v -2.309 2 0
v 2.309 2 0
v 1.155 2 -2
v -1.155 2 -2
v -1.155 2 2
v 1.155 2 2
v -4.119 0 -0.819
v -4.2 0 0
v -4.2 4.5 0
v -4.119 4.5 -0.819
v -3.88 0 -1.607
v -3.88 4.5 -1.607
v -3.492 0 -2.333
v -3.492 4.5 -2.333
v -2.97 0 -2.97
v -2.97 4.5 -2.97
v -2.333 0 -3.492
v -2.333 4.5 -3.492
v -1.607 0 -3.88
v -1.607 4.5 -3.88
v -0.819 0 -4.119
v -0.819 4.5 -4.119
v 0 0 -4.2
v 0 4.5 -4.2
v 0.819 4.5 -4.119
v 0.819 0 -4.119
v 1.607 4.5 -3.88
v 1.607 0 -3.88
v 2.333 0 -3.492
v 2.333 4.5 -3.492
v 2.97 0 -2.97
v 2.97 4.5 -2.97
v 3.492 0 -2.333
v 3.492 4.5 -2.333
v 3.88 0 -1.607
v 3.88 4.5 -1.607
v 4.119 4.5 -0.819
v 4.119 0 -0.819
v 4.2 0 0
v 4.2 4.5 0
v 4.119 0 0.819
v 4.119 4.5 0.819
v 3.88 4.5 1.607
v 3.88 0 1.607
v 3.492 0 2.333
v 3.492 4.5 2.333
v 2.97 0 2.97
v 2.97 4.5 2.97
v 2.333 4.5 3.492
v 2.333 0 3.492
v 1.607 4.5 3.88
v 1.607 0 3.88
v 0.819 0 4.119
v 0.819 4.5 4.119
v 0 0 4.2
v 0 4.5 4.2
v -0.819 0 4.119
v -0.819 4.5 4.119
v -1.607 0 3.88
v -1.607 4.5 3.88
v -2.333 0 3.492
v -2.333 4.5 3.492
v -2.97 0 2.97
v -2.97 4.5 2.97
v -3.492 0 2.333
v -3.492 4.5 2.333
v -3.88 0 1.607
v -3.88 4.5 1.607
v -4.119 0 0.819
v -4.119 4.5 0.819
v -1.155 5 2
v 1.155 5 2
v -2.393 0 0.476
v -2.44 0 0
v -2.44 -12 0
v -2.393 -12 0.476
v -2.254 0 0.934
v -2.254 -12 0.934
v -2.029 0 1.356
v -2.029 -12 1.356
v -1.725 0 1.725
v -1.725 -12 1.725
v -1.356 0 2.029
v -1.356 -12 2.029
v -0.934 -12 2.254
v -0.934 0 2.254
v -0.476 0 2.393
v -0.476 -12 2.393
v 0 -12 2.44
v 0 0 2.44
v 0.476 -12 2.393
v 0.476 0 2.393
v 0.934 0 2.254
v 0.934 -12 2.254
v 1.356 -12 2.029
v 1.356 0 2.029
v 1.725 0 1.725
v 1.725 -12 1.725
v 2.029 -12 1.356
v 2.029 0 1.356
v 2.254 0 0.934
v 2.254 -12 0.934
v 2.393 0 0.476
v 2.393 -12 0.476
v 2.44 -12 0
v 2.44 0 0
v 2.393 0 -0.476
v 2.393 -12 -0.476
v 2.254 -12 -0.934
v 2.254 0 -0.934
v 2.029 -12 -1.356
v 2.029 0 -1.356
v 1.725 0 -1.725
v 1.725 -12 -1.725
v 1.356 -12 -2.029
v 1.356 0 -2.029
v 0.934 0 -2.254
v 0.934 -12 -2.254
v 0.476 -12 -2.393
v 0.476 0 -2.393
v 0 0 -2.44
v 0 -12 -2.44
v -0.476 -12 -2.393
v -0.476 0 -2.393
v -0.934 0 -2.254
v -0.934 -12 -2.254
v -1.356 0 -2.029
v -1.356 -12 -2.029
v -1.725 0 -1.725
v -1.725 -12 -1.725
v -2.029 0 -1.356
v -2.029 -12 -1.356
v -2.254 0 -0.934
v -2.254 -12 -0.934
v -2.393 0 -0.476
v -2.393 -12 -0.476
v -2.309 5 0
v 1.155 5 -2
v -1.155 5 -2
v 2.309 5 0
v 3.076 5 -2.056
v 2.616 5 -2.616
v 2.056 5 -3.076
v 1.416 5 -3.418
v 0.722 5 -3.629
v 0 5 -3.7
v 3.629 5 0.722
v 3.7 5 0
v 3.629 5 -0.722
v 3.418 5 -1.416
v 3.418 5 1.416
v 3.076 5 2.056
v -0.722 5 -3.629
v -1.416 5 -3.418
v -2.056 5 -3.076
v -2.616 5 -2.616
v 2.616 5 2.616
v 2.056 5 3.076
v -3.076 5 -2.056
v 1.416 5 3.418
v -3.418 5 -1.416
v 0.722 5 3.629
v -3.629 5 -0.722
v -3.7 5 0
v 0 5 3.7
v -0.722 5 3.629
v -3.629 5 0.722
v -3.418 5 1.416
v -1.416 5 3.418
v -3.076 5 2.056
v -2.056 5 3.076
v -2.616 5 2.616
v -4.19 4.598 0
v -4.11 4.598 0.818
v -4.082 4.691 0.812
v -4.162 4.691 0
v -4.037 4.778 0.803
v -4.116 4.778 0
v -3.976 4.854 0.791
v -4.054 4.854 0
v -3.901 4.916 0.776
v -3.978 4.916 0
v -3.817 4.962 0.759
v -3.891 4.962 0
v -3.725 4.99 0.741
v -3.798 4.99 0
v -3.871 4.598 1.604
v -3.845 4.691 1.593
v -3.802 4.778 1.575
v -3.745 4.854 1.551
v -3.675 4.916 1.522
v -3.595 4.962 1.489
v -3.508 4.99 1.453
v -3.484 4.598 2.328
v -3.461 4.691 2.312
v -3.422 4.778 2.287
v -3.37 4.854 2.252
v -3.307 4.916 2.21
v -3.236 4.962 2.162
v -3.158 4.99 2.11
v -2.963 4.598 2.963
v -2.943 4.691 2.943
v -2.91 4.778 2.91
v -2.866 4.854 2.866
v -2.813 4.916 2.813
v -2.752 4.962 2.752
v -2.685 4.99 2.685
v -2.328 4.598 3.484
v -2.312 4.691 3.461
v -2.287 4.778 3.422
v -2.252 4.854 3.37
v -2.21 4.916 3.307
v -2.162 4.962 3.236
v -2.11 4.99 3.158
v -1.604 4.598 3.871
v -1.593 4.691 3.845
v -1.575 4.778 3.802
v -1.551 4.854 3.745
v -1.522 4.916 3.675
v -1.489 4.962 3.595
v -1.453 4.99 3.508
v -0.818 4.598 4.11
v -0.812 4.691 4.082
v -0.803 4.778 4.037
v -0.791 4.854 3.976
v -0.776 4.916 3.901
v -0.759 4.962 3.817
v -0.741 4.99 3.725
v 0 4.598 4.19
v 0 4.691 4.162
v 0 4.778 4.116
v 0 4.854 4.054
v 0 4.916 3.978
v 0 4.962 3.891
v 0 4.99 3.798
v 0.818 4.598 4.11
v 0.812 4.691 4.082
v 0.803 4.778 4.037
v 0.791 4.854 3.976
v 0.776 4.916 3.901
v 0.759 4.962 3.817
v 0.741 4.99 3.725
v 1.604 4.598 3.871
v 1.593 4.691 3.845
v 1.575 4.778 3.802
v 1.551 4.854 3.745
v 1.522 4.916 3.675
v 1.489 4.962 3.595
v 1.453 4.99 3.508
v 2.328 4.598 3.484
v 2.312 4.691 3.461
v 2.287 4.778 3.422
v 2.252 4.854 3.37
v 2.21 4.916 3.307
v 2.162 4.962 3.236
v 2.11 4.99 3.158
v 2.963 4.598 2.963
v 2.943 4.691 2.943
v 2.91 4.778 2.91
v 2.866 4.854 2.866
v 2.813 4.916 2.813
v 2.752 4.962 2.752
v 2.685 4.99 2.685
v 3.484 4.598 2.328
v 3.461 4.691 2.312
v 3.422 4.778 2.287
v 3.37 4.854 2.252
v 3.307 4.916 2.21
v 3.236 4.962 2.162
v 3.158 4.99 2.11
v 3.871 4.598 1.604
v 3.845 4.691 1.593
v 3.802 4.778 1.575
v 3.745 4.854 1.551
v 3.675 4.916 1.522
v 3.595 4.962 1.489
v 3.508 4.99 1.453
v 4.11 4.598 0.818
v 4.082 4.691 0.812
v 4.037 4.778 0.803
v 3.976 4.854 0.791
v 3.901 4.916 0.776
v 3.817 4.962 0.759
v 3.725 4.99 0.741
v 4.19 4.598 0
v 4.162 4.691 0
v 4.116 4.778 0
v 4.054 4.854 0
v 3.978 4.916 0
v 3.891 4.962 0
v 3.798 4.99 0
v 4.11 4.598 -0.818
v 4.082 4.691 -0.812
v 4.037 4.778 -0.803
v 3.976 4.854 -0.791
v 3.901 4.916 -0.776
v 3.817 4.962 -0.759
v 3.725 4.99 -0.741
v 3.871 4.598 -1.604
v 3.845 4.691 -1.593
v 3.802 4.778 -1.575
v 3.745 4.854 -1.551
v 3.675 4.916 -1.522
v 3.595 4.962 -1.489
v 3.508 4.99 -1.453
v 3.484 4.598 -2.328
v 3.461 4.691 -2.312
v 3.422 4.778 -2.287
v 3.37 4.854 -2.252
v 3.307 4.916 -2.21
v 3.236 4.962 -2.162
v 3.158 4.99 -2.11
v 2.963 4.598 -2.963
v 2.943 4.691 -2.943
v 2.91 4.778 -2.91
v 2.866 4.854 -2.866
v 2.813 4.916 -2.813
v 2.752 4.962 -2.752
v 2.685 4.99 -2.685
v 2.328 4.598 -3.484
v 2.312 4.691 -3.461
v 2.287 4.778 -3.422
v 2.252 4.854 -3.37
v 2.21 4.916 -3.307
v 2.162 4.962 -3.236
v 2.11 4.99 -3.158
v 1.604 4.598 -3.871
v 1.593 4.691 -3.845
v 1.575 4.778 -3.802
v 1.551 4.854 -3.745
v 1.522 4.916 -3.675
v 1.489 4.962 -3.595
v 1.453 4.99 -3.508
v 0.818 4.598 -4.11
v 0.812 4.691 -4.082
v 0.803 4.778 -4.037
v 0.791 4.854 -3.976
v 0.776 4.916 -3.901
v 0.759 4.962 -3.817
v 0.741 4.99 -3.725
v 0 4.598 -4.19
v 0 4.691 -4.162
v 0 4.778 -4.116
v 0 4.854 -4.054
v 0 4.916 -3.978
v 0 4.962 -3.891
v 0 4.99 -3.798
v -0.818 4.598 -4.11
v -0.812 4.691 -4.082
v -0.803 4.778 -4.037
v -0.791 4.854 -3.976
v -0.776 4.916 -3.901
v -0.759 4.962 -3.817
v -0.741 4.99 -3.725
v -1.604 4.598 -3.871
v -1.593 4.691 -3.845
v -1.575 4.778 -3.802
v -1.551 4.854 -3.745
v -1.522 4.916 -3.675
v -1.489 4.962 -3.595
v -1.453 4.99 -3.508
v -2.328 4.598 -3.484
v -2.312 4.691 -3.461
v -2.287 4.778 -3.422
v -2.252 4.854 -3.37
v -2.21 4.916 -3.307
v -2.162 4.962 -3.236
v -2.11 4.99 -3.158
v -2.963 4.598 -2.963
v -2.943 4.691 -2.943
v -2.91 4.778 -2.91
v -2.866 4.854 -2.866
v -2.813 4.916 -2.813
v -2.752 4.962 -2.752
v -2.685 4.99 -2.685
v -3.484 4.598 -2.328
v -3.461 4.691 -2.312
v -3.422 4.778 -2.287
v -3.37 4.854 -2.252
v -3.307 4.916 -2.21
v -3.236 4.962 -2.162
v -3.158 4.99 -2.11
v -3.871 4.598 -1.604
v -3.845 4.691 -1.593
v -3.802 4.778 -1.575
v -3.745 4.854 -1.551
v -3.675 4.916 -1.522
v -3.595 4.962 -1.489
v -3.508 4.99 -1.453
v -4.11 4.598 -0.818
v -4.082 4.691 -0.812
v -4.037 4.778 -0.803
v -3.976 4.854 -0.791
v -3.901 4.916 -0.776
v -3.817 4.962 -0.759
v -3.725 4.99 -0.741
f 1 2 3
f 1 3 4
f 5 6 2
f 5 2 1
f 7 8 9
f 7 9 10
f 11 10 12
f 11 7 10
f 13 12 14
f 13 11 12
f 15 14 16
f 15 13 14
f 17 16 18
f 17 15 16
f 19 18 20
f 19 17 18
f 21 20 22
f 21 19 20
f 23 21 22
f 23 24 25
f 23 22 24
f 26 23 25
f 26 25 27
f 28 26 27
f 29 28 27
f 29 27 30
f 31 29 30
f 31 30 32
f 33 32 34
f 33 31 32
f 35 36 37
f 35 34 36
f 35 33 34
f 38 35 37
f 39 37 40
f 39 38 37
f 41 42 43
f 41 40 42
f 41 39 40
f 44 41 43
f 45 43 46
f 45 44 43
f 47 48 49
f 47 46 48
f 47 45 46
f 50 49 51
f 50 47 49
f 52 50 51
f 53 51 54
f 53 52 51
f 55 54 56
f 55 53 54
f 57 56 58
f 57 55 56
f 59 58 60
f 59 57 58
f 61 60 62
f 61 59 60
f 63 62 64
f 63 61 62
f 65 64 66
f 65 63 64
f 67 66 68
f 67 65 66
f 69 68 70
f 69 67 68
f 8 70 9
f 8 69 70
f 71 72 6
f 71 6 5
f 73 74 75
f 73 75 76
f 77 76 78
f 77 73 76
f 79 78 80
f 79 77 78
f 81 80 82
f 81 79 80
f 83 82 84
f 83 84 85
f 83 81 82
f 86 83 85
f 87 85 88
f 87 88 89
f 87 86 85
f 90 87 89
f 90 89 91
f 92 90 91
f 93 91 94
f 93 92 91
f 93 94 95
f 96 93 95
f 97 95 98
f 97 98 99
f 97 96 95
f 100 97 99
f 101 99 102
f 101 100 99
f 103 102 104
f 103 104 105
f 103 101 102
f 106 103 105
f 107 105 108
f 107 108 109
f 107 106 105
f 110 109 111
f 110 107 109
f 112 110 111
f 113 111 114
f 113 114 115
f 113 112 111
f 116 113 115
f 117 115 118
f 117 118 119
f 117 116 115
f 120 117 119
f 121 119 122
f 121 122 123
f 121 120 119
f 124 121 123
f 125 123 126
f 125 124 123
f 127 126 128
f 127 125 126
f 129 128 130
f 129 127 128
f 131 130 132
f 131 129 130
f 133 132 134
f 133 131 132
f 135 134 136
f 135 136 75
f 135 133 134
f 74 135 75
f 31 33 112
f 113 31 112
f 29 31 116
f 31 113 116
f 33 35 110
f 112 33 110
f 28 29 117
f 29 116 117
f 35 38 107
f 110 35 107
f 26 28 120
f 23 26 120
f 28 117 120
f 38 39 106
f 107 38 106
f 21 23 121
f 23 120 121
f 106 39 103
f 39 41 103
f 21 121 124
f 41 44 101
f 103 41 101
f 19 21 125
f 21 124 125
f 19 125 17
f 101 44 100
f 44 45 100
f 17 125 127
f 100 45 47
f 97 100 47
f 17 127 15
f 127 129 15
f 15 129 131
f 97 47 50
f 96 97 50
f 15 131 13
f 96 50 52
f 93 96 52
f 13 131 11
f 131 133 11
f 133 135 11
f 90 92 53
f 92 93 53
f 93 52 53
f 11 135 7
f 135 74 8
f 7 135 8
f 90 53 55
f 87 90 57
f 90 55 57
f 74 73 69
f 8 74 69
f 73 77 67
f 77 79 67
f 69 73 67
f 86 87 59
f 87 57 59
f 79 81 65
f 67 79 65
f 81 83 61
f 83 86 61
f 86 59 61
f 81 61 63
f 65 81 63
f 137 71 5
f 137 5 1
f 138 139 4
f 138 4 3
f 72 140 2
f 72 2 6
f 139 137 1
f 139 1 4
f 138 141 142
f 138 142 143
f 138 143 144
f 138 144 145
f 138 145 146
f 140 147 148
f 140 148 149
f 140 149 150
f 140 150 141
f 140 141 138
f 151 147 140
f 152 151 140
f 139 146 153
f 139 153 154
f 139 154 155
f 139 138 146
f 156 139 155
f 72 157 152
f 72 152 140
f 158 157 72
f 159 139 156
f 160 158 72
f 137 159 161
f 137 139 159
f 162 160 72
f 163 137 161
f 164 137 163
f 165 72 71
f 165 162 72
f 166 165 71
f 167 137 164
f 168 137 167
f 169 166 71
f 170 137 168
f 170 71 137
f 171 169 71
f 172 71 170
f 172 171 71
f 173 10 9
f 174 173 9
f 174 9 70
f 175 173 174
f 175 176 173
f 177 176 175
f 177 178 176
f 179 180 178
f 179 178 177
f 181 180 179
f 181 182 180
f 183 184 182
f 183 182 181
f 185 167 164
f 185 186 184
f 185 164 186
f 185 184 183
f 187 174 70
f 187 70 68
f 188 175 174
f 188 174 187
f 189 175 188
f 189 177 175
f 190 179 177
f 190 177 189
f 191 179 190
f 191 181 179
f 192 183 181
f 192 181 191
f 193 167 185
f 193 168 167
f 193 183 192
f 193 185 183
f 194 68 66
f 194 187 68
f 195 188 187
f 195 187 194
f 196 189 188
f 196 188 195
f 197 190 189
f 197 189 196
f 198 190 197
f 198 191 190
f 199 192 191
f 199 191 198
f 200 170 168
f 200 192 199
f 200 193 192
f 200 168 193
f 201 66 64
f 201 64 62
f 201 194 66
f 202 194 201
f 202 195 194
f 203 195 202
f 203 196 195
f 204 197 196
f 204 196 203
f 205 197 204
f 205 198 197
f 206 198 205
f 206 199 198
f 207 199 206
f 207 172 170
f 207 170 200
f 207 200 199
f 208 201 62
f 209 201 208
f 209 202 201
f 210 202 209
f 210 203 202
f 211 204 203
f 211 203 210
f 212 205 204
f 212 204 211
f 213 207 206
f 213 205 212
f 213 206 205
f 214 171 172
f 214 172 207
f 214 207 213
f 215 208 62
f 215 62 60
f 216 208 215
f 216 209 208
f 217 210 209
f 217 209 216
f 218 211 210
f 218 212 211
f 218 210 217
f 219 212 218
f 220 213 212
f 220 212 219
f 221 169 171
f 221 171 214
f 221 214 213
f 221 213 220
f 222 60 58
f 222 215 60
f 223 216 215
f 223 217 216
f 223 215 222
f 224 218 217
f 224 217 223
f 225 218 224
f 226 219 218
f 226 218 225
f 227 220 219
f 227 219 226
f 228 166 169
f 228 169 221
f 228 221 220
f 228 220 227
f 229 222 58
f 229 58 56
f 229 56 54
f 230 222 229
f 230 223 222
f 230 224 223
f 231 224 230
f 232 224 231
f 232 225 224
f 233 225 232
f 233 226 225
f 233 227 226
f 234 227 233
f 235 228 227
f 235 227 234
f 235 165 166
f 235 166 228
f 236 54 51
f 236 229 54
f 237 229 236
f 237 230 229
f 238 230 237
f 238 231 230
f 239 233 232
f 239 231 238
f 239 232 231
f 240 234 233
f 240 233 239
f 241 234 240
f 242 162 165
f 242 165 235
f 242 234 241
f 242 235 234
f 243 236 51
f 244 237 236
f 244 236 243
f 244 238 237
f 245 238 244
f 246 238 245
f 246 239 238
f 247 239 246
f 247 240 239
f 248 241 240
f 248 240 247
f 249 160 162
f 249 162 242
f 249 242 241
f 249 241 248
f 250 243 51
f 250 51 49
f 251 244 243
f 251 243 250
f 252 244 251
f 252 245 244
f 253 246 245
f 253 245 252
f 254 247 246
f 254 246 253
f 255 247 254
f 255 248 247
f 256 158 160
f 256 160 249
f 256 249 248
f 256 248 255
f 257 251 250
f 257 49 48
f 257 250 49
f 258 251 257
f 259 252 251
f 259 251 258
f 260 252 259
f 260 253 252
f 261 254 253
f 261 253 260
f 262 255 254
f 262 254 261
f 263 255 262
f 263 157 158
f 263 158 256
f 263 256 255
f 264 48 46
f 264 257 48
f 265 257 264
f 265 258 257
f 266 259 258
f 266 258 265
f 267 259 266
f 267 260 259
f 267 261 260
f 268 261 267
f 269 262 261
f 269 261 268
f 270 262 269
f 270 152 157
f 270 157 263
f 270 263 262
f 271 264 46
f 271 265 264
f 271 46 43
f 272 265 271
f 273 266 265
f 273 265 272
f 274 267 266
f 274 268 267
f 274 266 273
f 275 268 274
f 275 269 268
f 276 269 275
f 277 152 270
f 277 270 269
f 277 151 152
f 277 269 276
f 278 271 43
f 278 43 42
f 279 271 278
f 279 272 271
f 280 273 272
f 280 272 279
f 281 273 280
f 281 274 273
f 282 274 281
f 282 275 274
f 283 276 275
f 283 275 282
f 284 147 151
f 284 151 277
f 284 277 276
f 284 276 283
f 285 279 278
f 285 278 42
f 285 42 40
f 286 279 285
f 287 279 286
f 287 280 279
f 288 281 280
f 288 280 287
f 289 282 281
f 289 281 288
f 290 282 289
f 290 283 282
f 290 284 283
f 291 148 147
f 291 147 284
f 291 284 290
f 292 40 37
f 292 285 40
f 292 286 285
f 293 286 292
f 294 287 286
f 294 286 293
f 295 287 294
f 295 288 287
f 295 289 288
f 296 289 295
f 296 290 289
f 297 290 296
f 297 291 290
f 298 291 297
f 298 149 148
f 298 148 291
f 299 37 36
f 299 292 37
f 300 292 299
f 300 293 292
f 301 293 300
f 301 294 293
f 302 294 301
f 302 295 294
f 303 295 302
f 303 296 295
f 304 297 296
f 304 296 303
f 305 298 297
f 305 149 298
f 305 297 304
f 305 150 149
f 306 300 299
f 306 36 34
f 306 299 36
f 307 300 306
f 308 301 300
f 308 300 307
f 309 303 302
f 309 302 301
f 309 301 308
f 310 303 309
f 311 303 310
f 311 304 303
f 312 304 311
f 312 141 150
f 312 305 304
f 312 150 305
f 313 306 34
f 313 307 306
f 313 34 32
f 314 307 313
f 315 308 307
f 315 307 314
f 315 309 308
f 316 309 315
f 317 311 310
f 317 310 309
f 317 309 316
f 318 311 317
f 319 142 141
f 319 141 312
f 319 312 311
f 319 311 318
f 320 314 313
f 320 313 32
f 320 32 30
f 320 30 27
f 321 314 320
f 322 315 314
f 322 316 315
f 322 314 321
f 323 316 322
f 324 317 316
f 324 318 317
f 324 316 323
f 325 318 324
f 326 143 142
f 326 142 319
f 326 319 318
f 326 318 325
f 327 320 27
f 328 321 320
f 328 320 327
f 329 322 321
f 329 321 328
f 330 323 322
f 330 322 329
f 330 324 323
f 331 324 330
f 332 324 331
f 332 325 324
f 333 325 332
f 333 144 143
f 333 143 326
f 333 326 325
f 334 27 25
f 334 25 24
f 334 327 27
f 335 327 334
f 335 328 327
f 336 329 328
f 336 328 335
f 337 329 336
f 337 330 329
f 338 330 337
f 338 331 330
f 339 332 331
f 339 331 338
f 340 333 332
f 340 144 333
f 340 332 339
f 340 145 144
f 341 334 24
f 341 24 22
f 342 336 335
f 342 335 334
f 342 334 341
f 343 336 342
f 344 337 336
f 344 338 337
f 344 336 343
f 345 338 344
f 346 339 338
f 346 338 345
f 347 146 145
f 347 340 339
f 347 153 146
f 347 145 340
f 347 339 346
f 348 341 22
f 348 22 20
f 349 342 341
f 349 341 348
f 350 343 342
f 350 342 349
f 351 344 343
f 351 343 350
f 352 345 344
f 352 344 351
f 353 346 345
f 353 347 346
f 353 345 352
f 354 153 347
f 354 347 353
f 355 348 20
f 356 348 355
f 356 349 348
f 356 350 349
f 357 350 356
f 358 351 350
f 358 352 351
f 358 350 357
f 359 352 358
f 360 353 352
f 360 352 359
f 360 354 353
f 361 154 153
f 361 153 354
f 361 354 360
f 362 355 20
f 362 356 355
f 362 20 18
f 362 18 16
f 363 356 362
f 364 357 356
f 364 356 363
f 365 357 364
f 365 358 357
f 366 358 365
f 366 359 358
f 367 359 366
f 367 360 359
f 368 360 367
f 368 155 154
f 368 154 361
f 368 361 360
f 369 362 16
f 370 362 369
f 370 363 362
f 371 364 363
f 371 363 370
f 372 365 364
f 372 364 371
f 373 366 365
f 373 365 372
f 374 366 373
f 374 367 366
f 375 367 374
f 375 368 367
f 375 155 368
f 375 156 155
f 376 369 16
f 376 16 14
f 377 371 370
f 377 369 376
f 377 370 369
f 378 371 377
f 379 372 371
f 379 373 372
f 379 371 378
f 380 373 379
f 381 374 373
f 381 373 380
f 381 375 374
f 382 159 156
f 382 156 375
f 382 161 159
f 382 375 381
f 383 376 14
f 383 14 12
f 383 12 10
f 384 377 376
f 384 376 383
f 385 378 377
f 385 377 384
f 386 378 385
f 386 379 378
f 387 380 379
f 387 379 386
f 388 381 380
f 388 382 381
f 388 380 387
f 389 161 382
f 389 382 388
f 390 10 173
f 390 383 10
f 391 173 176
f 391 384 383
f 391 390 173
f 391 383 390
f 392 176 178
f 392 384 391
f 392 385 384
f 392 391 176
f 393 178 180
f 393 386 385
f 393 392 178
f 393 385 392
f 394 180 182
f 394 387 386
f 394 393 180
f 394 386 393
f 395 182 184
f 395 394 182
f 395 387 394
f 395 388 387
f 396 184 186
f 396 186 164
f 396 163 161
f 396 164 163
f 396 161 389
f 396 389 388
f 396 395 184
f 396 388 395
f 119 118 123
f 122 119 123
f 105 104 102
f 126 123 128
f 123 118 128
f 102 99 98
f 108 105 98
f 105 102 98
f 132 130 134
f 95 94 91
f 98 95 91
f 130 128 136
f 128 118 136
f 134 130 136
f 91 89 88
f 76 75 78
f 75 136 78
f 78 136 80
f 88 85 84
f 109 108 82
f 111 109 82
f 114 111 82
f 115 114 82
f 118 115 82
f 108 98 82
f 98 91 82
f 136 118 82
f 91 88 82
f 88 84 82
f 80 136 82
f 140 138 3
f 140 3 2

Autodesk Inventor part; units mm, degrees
ref_plane "YZ Plane" through (0, 0, 0) normal (1, 0, 0) x (0, 1, 0)
ref_plane "XZ Plane" through (0, 0, 0) normal (0, 1, 0) x (-1, 0, 0)
ref_plane "XY Plane" through (0, 0, 0) normal (0, 0, 1) x (1, 0, 0)
sketch "Sketch1" plane through (0, 0, 0) normal (0, 1, 0) x (-1, 0, 0)
  circle A0 centre (0, 0) radius 2.44
  circle A1 centre (0, 0) radius 4.2
  line L0 (1.1547, -2) -> (-1.1547, -2)
  line L1 (-1.1547, -2) -> (-2.3094, 0)
  line L2 (-2.3094, 0) -> (-1.1547, 2)
  line L3 (-1.1547, 2) -> (1.1547, 2)
  line L4 (1.1547, 2) -> (2.3094, 0)
  line L5 (2.3094, 0) -> (1.1547, -2)
  dimension "d0" = 4.88
  dimension "d1" = 8.4
  dimension "d8" = 4
extrude "Extrusion1" add sketch "Sketch1" along normal blind 5 contours A0 | A1 | L0 L1 L2 L3 L4 L5
extrude "Extrusion2" add sketch "Sketch1" against normal blind 12 contours A0 | L0 L1 L2 L3 L4 L5
extrude "Extrusion3" cut sketch "Sketch1" against normal blind 3 from surface at 5 contours L0 L1 L2 L3 L4 L5
fillet "Fillet1" radius 0.5 1 edges at (4.2, 5, 0)
thread "Thread2" size "M5x0.8" class "6g" standard "ANSI Metric M Profile" full length
equation "\"d4\" = length"
equation "\"length\" = 12"
properties part number "M5x12"
